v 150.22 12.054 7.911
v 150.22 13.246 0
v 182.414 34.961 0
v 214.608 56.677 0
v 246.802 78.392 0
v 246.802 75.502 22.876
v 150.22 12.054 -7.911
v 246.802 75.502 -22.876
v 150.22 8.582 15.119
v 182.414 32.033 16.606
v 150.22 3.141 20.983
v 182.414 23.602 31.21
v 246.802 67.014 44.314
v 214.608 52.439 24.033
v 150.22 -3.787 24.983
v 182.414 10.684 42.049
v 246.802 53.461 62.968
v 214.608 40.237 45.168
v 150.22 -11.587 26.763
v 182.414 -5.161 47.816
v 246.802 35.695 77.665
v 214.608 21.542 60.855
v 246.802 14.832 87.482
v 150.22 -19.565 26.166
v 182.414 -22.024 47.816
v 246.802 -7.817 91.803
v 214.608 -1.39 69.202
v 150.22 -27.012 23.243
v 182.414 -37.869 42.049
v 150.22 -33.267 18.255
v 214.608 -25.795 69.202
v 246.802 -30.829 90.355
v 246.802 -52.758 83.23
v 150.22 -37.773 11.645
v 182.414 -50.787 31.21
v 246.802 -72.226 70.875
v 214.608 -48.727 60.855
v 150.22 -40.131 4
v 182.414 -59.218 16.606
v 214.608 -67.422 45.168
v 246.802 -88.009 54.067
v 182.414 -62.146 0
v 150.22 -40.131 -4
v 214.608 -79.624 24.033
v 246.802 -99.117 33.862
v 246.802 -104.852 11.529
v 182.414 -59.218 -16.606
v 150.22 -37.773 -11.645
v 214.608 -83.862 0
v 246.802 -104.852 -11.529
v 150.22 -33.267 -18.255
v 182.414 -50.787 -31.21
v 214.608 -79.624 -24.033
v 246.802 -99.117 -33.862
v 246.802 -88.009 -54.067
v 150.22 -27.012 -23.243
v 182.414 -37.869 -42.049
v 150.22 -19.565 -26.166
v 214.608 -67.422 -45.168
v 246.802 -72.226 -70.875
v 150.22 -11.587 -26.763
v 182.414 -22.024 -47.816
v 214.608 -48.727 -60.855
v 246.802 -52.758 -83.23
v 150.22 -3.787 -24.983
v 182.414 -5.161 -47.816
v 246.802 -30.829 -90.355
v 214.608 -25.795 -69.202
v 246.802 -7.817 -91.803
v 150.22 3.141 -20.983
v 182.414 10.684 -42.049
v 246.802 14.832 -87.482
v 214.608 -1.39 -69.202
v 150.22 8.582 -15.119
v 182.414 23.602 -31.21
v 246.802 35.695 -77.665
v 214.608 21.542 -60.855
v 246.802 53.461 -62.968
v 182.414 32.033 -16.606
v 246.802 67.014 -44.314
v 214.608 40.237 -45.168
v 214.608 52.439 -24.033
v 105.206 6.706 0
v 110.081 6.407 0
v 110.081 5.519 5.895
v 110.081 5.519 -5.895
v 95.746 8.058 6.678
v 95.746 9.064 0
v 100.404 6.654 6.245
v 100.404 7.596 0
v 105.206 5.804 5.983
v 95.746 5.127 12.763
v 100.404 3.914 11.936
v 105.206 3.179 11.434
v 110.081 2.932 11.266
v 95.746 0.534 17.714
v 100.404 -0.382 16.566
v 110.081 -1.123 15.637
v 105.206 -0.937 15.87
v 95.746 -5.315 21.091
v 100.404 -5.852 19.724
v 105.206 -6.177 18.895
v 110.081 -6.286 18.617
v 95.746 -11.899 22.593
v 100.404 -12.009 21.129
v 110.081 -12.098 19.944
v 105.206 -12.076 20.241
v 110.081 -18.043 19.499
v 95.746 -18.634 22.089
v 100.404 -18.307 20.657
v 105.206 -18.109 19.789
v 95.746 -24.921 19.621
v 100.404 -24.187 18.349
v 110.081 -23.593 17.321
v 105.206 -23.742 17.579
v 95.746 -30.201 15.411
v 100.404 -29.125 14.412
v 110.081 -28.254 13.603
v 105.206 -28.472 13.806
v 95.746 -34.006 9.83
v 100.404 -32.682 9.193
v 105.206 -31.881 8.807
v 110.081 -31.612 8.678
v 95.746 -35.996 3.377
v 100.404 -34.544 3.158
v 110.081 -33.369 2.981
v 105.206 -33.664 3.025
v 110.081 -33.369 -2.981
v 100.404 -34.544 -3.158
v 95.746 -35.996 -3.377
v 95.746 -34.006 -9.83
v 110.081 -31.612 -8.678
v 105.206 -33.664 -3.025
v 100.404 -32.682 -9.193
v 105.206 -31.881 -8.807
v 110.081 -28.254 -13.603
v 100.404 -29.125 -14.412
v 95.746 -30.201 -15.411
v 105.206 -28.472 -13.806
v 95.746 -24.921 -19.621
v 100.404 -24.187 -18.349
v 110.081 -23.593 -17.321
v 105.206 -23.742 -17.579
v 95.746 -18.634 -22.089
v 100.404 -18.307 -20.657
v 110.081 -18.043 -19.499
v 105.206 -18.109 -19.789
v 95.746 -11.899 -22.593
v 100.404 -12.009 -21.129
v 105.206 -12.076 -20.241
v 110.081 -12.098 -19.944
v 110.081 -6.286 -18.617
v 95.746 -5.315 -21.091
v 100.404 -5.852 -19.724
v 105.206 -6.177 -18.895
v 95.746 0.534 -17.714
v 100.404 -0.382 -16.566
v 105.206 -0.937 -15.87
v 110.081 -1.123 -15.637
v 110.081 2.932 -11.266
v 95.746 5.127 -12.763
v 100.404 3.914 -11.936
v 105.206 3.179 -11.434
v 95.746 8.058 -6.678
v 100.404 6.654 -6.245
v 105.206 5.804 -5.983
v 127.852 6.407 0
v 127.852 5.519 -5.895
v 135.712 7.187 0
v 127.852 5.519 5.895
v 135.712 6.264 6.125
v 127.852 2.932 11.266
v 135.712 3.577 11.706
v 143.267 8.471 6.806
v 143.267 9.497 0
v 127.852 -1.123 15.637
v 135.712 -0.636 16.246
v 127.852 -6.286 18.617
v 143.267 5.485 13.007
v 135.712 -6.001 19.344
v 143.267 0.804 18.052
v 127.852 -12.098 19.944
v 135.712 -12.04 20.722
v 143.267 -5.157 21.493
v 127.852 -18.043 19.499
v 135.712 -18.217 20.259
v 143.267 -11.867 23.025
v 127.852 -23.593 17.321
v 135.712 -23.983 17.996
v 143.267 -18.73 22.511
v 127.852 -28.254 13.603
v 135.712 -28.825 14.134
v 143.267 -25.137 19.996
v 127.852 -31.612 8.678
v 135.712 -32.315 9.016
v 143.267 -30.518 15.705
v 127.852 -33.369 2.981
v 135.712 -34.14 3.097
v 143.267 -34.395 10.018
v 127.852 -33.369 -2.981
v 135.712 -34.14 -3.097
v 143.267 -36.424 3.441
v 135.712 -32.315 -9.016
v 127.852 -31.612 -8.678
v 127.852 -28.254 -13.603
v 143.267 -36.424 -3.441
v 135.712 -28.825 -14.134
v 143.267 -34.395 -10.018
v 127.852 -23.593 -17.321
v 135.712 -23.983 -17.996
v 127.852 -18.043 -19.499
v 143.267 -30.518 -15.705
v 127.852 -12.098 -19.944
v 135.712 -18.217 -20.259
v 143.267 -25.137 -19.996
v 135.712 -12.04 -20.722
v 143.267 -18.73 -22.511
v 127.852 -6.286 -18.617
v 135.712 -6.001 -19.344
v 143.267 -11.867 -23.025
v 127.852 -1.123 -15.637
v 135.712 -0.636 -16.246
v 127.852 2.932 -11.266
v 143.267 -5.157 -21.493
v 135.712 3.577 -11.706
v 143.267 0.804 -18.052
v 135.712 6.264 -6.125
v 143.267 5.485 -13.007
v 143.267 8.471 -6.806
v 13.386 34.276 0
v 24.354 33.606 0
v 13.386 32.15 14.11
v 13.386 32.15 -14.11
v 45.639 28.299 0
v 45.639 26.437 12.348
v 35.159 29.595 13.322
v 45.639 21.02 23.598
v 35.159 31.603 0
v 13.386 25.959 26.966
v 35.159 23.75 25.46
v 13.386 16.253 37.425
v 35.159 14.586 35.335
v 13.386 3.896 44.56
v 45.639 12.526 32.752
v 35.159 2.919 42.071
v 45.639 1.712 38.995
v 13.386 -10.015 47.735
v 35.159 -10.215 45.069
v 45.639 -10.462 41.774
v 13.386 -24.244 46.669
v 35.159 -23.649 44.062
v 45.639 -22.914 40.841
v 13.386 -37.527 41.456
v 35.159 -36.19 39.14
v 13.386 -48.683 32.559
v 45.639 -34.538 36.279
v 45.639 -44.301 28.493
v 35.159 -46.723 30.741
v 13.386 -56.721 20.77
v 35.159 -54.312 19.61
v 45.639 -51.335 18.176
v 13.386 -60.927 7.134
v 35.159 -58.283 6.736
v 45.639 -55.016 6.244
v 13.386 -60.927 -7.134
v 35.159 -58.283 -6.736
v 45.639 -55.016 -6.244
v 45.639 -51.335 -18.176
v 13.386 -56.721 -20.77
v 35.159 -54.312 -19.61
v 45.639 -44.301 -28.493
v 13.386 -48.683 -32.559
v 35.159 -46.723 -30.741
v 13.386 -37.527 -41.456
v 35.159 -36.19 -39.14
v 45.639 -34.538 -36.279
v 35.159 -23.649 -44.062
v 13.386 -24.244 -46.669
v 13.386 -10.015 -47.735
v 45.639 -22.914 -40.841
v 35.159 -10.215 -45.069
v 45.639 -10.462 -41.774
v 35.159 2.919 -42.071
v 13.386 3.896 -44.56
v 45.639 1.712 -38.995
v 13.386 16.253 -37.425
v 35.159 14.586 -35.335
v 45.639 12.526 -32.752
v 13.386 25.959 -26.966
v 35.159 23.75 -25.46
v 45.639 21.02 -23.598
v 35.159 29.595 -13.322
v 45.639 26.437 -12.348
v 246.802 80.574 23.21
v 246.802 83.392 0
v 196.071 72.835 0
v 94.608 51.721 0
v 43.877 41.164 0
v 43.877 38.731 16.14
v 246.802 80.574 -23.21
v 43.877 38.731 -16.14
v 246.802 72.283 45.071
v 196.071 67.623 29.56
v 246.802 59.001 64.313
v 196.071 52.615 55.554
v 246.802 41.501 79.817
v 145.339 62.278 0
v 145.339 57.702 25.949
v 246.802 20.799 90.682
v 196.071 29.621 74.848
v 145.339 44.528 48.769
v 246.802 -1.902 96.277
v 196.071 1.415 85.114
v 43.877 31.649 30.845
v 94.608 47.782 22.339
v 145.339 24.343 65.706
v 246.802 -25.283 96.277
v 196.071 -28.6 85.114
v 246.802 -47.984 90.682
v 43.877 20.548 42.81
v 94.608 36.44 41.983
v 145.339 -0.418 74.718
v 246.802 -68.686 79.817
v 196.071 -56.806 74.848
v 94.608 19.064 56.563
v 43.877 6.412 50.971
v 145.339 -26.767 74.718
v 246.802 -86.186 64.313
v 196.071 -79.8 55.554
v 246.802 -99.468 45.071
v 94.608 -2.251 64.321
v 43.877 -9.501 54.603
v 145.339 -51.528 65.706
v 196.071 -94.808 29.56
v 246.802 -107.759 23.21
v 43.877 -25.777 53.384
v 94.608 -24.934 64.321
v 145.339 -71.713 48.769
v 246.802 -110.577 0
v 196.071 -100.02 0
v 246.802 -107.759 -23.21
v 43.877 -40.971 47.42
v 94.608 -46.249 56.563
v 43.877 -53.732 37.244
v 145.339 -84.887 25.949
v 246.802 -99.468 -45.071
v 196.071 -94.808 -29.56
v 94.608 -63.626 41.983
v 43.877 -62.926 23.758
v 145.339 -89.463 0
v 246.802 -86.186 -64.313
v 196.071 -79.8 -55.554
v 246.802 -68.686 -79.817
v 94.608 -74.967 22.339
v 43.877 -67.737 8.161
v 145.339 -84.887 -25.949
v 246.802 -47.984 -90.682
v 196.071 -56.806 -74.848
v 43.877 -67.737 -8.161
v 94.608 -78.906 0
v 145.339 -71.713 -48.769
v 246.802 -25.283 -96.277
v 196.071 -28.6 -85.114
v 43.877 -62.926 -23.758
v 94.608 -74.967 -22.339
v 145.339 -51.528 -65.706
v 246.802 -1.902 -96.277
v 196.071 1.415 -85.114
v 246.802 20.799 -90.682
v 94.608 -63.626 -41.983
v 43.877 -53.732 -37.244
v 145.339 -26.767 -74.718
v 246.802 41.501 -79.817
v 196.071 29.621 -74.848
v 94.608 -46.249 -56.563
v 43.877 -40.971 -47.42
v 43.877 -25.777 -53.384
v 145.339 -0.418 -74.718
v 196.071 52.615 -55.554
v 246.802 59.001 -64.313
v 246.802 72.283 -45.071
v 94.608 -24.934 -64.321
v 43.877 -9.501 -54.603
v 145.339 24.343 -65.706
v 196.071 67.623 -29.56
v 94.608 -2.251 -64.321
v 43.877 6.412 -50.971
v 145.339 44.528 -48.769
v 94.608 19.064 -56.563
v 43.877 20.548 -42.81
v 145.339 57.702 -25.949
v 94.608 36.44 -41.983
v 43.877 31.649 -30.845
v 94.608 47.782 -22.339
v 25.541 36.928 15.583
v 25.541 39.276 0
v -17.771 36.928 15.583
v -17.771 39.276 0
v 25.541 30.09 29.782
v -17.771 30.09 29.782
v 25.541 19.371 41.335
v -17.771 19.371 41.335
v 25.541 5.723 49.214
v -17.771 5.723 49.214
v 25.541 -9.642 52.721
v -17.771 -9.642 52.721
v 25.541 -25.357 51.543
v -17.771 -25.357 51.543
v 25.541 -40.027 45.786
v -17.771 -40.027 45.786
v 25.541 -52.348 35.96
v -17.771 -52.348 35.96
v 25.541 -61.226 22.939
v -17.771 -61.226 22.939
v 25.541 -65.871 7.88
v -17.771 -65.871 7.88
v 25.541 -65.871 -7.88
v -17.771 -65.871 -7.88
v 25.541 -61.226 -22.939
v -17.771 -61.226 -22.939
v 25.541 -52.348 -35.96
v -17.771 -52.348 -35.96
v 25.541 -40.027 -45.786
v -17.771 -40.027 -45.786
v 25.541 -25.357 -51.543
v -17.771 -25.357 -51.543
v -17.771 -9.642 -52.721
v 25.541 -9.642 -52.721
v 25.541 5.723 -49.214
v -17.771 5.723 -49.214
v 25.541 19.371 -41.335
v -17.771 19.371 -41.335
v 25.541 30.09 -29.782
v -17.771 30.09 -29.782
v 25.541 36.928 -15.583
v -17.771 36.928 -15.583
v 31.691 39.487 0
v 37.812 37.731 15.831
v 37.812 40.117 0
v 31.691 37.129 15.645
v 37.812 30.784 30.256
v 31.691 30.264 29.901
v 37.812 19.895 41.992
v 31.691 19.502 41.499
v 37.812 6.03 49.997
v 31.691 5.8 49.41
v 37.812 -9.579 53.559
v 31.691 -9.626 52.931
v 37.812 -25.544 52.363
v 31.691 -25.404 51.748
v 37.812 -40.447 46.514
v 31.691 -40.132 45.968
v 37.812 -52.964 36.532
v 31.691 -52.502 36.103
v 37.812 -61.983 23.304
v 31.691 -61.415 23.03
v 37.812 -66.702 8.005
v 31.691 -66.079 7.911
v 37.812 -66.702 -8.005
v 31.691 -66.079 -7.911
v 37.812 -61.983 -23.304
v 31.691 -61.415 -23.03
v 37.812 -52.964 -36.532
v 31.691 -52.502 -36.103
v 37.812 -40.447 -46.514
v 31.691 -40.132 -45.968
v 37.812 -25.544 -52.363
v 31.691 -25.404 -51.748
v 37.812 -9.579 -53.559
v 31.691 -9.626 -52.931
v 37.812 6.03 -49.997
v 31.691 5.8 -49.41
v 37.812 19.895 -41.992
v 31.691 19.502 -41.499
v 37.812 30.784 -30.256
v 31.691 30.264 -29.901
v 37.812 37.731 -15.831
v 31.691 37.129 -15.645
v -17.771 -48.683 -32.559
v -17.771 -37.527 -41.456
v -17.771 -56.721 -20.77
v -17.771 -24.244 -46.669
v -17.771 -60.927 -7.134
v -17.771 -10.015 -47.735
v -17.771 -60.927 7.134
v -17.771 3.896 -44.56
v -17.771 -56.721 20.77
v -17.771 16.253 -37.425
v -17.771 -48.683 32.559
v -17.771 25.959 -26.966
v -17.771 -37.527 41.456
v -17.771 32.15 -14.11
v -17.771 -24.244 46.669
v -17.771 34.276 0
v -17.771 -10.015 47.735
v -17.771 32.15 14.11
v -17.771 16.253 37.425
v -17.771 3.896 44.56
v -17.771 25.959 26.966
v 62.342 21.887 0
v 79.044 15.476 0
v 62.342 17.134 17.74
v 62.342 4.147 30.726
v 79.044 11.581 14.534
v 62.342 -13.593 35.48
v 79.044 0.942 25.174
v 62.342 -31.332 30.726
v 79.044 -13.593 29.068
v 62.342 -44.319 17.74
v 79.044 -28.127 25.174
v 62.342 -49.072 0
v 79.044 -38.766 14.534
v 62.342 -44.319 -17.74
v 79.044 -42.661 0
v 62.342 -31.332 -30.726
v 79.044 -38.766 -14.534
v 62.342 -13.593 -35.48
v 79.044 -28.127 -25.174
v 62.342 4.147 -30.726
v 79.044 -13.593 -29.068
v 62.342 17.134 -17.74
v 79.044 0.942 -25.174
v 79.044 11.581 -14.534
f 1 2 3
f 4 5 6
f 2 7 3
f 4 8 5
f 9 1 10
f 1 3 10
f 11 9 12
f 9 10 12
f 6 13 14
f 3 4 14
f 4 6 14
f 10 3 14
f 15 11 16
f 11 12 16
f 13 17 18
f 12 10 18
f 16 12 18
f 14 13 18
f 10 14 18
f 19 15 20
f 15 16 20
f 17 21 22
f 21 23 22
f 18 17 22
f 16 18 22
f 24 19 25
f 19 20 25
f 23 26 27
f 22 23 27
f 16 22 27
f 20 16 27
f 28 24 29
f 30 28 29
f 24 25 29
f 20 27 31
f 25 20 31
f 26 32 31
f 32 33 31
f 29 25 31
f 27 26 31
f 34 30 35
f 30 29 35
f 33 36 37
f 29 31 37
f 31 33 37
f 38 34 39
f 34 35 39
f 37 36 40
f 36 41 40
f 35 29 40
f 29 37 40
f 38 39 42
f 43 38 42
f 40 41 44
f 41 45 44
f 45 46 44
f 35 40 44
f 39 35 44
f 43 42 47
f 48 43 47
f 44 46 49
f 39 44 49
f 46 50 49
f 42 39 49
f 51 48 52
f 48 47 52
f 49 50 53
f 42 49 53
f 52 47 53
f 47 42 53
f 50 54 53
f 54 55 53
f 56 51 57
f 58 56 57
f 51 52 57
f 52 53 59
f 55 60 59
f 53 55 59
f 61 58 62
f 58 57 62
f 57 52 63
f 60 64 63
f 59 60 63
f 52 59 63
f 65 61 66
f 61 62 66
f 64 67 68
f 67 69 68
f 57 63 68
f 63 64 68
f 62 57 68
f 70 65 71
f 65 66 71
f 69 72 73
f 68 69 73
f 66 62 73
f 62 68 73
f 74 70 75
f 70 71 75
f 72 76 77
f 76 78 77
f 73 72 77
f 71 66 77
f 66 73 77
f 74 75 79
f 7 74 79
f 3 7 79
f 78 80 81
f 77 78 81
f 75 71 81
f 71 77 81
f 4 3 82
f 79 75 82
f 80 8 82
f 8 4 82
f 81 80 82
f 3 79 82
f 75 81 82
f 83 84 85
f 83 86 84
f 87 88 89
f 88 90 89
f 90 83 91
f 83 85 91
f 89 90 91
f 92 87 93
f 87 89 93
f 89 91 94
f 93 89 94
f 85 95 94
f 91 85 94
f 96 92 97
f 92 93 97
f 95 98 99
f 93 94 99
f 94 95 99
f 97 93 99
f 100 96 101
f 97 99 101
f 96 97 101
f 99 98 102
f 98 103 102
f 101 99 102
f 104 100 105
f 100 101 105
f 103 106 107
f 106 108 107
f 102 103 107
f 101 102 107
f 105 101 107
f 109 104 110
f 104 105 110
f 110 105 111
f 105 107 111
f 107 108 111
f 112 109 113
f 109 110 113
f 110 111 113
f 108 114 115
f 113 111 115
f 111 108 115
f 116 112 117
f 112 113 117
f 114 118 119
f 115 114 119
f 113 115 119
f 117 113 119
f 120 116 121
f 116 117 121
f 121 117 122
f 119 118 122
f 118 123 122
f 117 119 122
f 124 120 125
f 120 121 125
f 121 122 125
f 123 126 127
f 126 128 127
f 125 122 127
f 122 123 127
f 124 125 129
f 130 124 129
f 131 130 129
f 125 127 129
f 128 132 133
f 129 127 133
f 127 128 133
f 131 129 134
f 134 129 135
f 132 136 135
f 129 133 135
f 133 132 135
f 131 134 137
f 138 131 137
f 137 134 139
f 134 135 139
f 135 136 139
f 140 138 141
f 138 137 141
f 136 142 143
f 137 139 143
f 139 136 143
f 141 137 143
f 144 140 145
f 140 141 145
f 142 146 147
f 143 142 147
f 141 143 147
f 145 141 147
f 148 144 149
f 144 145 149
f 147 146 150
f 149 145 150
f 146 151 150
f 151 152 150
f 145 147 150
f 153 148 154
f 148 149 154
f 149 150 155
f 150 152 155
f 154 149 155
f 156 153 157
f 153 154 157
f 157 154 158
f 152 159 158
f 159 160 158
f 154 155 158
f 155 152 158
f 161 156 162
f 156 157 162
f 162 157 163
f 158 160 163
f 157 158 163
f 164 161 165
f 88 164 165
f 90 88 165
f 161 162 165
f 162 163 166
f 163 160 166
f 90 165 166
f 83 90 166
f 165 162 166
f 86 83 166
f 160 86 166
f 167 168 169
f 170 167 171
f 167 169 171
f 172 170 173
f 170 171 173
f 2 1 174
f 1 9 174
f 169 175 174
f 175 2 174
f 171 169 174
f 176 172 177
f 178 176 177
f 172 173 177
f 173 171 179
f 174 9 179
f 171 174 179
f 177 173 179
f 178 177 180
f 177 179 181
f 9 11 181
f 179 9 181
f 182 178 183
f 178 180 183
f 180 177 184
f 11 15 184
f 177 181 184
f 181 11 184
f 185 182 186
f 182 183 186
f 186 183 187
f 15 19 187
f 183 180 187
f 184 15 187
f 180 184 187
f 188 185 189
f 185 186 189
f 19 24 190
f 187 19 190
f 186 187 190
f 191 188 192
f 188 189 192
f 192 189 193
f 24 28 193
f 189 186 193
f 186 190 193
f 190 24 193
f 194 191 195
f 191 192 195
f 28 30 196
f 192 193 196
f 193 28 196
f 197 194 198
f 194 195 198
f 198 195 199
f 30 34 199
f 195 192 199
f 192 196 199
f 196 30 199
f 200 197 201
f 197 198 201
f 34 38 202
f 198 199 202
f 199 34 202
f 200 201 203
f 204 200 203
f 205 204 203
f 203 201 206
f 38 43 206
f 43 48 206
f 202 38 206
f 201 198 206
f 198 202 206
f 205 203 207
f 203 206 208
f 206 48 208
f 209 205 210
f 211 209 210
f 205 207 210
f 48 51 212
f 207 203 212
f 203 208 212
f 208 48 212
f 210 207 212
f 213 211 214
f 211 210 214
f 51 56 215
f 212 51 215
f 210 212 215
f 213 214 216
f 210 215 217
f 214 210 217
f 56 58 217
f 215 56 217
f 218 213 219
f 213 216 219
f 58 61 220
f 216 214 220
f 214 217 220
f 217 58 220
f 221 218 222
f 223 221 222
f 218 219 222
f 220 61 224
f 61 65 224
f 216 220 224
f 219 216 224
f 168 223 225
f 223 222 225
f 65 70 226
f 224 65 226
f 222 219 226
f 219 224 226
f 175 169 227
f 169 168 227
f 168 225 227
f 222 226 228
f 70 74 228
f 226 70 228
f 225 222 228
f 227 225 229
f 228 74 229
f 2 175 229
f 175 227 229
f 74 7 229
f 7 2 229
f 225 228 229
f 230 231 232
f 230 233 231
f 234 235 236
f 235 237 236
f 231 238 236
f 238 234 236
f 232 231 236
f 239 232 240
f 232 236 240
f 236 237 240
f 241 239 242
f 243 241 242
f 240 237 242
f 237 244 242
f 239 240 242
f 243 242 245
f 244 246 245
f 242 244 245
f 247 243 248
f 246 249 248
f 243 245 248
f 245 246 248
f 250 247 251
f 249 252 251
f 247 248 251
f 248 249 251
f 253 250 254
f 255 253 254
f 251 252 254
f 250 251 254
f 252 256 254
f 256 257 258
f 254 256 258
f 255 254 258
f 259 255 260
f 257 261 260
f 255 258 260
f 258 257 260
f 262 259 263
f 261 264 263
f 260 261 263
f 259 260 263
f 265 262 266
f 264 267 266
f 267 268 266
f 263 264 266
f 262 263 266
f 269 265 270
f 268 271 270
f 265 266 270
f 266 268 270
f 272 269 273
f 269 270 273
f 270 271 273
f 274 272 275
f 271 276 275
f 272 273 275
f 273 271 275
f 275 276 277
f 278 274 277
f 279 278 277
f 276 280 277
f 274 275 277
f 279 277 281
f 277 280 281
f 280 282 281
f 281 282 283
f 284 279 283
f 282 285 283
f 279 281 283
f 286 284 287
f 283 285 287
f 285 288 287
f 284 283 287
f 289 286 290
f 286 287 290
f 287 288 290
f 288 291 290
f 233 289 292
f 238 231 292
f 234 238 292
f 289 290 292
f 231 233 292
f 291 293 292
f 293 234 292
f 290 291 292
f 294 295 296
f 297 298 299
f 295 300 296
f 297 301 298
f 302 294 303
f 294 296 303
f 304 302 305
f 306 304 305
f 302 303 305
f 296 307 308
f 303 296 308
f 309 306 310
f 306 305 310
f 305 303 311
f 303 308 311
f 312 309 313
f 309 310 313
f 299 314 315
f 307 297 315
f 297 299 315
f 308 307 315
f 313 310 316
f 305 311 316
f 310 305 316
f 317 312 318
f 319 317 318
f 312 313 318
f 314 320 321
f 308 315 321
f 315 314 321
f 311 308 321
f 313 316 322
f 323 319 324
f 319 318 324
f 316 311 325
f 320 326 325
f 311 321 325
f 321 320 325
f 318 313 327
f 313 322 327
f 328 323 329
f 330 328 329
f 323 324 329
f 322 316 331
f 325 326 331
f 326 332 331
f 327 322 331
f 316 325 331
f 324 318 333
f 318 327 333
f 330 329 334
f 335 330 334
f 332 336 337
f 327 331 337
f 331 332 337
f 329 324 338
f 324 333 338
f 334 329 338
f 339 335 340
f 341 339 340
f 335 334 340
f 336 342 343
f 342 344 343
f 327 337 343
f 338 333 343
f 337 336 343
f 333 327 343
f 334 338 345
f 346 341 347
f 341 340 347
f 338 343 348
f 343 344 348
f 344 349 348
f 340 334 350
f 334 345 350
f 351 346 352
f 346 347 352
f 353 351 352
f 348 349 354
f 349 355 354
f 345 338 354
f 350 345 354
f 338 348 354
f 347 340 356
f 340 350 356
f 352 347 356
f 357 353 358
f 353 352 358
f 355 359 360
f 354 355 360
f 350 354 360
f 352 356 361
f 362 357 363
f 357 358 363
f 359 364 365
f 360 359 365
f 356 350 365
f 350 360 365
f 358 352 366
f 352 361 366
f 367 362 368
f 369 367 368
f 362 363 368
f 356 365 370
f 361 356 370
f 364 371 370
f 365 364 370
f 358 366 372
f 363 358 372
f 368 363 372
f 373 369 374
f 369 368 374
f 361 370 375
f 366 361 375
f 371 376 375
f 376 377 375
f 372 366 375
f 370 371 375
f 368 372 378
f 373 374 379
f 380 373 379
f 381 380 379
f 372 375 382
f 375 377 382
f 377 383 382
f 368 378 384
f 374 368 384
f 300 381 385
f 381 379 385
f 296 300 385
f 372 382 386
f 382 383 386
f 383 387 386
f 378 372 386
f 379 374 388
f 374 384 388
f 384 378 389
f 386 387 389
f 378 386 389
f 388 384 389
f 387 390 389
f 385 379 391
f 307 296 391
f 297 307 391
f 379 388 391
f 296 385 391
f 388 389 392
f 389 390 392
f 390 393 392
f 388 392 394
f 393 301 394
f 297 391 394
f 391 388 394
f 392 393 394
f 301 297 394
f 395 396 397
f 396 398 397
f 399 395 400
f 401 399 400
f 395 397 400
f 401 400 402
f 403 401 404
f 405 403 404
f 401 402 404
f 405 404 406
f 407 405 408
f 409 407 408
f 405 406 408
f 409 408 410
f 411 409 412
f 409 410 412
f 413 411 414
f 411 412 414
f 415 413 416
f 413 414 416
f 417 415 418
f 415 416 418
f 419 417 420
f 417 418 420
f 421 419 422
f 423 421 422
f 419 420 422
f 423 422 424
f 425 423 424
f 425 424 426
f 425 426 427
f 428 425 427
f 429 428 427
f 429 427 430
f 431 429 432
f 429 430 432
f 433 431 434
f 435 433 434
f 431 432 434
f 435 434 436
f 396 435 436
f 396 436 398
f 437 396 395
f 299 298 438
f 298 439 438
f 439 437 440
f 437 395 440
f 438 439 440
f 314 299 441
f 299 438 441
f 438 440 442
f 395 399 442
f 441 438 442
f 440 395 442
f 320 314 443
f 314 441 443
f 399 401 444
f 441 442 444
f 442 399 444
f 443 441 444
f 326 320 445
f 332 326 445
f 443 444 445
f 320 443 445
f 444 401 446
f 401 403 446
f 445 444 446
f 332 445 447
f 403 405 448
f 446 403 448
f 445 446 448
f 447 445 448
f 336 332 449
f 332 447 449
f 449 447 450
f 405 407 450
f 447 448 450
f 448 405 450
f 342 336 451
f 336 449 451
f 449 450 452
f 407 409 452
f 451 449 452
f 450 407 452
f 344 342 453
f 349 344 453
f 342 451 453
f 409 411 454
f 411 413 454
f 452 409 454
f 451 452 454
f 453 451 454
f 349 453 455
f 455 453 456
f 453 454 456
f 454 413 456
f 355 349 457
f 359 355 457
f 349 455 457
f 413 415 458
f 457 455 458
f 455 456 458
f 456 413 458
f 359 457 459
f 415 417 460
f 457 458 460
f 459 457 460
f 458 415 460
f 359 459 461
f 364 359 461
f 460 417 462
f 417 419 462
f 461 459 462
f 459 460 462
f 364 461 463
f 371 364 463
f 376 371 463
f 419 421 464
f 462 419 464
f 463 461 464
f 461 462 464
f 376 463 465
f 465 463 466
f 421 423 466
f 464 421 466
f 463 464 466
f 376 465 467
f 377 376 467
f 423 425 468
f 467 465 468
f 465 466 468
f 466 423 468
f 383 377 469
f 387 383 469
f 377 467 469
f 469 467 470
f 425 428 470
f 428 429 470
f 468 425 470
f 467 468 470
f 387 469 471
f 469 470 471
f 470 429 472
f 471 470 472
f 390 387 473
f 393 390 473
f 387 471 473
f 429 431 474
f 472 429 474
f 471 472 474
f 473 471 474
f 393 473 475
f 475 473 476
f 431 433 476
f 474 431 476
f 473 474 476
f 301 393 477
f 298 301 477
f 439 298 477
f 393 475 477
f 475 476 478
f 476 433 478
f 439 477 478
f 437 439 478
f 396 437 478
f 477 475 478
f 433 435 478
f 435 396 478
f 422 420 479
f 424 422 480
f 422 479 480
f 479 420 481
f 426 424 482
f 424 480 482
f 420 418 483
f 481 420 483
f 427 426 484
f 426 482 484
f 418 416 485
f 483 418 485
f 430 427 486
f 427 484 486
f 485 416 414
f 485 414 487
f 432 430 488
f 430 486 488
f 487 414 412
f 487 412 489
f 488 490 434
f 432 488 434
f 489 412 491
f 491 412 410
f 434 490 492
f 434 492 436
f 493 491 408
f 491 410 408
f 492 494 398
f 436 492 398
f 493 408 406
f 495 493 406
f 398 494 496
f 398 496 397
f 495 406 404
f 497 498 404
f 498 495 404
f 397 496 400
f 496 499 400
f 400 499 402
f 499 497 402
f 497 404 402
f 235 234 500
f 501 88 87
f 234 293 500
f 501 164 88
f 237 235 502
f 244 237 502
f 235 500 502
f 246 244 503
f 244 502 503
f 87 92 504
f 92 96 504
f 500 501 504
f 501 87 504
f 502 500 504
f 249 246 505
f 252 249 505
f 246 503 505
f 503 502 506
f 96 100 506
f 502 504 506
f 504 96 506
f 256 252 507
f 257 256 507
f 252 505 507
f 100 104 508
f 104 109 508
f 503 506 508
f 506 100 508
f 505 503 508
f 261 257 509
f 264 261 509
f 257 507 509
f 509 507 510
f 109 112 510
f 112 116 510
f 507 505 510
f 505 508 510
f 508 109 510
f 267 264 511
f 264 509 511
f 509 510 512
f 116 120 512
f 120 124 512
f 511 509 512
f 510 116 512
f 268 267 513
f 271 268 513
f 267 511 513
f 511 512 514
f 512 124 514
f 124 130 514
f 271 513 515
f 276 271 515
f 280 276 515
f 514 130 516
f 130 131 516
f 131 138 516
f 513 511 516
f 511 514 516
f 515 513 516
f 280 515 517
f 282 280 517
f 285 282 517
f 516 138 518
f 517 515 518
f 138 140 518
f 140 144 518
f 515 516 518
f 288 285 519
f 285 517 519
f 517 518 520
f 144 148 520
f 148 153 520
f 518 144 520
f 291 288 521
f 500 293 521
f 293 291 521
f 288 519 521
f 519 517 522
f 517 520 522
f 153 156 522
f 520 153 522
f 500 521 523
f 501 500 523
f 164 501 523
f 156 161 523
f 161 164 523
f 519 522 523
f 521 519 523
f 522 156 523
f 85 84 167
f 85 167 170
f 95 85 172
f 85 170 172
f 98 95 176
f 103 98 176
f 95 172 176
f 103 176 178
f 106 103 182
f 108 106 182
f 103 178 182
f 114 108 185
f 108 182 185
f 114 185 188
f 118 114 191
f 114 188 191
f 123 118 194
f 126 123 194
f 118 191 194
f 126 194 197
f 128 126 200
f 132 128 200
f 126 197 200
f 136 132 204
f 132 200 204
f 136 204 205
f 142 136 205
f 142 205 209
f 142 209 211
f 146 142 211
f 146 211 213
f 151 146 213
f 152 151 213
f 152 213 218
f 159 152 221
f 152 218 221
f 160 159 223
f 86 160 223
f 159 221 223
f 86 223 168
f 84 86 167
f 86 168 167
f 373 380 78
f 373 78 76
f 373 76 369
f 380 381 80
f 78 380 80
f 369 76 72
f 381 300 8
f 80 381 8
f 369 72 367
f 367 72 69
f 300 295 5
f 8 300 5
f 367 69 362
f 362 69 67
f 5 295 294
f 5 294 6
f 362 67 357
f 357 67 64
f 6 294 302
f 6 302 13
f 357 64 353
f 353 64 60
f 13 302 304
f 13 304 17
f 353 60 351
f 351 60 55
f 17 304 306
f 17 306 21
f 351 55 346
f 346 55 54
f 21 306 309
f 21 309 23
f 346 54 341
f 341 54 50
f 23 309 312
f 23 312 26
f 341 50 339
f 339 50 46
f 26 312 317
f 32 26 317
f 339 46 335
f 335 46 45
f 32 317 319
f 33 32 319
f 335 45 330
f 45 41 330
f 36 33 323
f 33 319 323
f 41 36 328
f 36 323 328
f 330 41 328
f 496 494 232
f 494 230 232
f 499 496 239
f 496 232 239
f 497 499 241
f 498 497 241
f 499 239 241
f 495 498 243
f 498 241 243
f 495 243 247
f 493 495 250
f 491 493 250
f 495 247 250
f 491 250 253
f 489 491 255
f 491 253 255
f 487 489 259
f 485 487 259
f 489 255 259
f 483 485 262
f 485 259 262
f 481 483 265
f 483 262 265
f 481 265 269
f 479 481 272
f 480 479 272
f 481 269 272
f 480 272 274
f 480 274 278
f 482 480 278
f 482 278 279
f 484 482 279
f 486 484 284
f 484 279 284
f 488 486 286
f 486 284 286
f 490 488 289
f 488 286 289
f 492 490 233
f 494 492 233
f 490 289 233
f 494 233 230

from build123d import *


with BuildPart() as part:
    # Sketch1 → Revolve2 (revolve)
    with BuildSketch(Plane.XY):
        with BuildLine():
            Line((45.639160326, 28.298601183), (95.74633283, 9.064259762))
            ThreePointArc((95.74633283, 9.064259762), (102.791629792, 7.077280519), (110.081050812, 6.407476822))
            Line((110.081050812, 6.407476822), (127.851823553, 6.407476822))
            ThreePointArc((127.851823553, 6.407476822), (139.546691742, 8.155286583), (150.219539692, 13.24597392))
            Line((150.219539692, 13.24597392), (246.802204076, 78.391803626))
            Line((246.802204076, 78.391803626), (246.802204076, 83.391803626))
            Line((246.802204076, 83.391803626), (43.876590917, 41.163939374))
            ThreePointArc((43.876590917, 41.163939374), (34.757151884, 39.749500606), (25.540810641, 39.276362798))
            Line((25.540810641, 39.276362798), (-17.770606993, 39.276362798))
            Line((-17.770606993, 39.276362798), (-17.770606993, 34.276362798))
            Line((-17.770606993, 34.276362798), (13.386044867, 34.276362798))
            ThreePointArc((13.386044867, 34.276362798), (29.787242162, 32.769304479), (45.639160326, 28.298601183))
        make_face()
    revolve(axis=Axis((-9.079018431, -13.592523178, 0), (1, 0, 0)))


solid = part.part
